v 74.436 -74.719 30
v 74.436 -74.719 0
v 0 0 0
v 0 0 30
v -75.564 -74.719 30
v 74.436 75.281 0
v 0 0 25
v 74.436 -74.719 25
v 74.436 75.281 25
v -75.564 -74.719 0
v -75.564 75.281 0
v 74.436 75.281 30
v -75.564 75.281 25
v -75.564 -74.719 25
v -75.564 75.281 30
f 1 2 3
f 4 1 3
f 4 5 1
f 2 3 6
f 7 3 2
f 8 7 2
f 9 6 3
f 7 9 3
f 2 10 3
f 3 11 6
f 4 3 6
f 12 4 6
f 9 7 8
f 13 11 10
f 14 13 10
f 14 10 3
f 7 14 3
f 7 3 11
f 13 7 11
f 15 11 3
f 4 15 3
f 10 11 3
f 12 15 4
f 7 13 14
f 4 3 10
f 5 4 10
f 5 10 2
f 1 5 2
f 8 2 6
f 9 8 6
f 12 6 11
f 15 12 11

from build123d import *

# Parameters (mm, degrees)
F1_DEPTH = 30
F2_DEPTH = 30
F3_DEPTH = 25
F4_DEPTH = 25


with BuildPart() as f1:
    # F0 (on Top) → F1 (new body)
    with BuildSketch(Plane.XY):
        Polygon((0, 0), (-75.564269, -74.718927), (74.435731, -74.718927), align=None)
    extrude(amount=F1_DEPTH)


with BuildPart() as f2:
    # F0 (on Top) → F2 (new body)
    with BuildSketch(Plane.XY):
        Polygon((74.435731, 75.281073), (-75.564269, 75.281073), (0, 0), align=None)
    extrude(amount=F2_DEPTH)


with BuildPart() as f3:
    # F0 (on Top) → F3 (new body)
    with BuildSketch(Plane.XY):
        Polygon((0, 0), (-75.564269, 75.281073), (-75.564269, -74.718927), align=None)
    extrude(amount=F3_DEPTH)


with BuildPart() as f4:
    # F0 (on Top) → F4 (new body)
    with BuildSketch(Plane.XY):
        Polygon((74.435731, -74.718927), (74.435731, 75.281073), (0, 0), align=None)
    extrude(amount=F4_DEPTH)


solid = Compound([f1.part, f2.part, f3.part, f4.part])
